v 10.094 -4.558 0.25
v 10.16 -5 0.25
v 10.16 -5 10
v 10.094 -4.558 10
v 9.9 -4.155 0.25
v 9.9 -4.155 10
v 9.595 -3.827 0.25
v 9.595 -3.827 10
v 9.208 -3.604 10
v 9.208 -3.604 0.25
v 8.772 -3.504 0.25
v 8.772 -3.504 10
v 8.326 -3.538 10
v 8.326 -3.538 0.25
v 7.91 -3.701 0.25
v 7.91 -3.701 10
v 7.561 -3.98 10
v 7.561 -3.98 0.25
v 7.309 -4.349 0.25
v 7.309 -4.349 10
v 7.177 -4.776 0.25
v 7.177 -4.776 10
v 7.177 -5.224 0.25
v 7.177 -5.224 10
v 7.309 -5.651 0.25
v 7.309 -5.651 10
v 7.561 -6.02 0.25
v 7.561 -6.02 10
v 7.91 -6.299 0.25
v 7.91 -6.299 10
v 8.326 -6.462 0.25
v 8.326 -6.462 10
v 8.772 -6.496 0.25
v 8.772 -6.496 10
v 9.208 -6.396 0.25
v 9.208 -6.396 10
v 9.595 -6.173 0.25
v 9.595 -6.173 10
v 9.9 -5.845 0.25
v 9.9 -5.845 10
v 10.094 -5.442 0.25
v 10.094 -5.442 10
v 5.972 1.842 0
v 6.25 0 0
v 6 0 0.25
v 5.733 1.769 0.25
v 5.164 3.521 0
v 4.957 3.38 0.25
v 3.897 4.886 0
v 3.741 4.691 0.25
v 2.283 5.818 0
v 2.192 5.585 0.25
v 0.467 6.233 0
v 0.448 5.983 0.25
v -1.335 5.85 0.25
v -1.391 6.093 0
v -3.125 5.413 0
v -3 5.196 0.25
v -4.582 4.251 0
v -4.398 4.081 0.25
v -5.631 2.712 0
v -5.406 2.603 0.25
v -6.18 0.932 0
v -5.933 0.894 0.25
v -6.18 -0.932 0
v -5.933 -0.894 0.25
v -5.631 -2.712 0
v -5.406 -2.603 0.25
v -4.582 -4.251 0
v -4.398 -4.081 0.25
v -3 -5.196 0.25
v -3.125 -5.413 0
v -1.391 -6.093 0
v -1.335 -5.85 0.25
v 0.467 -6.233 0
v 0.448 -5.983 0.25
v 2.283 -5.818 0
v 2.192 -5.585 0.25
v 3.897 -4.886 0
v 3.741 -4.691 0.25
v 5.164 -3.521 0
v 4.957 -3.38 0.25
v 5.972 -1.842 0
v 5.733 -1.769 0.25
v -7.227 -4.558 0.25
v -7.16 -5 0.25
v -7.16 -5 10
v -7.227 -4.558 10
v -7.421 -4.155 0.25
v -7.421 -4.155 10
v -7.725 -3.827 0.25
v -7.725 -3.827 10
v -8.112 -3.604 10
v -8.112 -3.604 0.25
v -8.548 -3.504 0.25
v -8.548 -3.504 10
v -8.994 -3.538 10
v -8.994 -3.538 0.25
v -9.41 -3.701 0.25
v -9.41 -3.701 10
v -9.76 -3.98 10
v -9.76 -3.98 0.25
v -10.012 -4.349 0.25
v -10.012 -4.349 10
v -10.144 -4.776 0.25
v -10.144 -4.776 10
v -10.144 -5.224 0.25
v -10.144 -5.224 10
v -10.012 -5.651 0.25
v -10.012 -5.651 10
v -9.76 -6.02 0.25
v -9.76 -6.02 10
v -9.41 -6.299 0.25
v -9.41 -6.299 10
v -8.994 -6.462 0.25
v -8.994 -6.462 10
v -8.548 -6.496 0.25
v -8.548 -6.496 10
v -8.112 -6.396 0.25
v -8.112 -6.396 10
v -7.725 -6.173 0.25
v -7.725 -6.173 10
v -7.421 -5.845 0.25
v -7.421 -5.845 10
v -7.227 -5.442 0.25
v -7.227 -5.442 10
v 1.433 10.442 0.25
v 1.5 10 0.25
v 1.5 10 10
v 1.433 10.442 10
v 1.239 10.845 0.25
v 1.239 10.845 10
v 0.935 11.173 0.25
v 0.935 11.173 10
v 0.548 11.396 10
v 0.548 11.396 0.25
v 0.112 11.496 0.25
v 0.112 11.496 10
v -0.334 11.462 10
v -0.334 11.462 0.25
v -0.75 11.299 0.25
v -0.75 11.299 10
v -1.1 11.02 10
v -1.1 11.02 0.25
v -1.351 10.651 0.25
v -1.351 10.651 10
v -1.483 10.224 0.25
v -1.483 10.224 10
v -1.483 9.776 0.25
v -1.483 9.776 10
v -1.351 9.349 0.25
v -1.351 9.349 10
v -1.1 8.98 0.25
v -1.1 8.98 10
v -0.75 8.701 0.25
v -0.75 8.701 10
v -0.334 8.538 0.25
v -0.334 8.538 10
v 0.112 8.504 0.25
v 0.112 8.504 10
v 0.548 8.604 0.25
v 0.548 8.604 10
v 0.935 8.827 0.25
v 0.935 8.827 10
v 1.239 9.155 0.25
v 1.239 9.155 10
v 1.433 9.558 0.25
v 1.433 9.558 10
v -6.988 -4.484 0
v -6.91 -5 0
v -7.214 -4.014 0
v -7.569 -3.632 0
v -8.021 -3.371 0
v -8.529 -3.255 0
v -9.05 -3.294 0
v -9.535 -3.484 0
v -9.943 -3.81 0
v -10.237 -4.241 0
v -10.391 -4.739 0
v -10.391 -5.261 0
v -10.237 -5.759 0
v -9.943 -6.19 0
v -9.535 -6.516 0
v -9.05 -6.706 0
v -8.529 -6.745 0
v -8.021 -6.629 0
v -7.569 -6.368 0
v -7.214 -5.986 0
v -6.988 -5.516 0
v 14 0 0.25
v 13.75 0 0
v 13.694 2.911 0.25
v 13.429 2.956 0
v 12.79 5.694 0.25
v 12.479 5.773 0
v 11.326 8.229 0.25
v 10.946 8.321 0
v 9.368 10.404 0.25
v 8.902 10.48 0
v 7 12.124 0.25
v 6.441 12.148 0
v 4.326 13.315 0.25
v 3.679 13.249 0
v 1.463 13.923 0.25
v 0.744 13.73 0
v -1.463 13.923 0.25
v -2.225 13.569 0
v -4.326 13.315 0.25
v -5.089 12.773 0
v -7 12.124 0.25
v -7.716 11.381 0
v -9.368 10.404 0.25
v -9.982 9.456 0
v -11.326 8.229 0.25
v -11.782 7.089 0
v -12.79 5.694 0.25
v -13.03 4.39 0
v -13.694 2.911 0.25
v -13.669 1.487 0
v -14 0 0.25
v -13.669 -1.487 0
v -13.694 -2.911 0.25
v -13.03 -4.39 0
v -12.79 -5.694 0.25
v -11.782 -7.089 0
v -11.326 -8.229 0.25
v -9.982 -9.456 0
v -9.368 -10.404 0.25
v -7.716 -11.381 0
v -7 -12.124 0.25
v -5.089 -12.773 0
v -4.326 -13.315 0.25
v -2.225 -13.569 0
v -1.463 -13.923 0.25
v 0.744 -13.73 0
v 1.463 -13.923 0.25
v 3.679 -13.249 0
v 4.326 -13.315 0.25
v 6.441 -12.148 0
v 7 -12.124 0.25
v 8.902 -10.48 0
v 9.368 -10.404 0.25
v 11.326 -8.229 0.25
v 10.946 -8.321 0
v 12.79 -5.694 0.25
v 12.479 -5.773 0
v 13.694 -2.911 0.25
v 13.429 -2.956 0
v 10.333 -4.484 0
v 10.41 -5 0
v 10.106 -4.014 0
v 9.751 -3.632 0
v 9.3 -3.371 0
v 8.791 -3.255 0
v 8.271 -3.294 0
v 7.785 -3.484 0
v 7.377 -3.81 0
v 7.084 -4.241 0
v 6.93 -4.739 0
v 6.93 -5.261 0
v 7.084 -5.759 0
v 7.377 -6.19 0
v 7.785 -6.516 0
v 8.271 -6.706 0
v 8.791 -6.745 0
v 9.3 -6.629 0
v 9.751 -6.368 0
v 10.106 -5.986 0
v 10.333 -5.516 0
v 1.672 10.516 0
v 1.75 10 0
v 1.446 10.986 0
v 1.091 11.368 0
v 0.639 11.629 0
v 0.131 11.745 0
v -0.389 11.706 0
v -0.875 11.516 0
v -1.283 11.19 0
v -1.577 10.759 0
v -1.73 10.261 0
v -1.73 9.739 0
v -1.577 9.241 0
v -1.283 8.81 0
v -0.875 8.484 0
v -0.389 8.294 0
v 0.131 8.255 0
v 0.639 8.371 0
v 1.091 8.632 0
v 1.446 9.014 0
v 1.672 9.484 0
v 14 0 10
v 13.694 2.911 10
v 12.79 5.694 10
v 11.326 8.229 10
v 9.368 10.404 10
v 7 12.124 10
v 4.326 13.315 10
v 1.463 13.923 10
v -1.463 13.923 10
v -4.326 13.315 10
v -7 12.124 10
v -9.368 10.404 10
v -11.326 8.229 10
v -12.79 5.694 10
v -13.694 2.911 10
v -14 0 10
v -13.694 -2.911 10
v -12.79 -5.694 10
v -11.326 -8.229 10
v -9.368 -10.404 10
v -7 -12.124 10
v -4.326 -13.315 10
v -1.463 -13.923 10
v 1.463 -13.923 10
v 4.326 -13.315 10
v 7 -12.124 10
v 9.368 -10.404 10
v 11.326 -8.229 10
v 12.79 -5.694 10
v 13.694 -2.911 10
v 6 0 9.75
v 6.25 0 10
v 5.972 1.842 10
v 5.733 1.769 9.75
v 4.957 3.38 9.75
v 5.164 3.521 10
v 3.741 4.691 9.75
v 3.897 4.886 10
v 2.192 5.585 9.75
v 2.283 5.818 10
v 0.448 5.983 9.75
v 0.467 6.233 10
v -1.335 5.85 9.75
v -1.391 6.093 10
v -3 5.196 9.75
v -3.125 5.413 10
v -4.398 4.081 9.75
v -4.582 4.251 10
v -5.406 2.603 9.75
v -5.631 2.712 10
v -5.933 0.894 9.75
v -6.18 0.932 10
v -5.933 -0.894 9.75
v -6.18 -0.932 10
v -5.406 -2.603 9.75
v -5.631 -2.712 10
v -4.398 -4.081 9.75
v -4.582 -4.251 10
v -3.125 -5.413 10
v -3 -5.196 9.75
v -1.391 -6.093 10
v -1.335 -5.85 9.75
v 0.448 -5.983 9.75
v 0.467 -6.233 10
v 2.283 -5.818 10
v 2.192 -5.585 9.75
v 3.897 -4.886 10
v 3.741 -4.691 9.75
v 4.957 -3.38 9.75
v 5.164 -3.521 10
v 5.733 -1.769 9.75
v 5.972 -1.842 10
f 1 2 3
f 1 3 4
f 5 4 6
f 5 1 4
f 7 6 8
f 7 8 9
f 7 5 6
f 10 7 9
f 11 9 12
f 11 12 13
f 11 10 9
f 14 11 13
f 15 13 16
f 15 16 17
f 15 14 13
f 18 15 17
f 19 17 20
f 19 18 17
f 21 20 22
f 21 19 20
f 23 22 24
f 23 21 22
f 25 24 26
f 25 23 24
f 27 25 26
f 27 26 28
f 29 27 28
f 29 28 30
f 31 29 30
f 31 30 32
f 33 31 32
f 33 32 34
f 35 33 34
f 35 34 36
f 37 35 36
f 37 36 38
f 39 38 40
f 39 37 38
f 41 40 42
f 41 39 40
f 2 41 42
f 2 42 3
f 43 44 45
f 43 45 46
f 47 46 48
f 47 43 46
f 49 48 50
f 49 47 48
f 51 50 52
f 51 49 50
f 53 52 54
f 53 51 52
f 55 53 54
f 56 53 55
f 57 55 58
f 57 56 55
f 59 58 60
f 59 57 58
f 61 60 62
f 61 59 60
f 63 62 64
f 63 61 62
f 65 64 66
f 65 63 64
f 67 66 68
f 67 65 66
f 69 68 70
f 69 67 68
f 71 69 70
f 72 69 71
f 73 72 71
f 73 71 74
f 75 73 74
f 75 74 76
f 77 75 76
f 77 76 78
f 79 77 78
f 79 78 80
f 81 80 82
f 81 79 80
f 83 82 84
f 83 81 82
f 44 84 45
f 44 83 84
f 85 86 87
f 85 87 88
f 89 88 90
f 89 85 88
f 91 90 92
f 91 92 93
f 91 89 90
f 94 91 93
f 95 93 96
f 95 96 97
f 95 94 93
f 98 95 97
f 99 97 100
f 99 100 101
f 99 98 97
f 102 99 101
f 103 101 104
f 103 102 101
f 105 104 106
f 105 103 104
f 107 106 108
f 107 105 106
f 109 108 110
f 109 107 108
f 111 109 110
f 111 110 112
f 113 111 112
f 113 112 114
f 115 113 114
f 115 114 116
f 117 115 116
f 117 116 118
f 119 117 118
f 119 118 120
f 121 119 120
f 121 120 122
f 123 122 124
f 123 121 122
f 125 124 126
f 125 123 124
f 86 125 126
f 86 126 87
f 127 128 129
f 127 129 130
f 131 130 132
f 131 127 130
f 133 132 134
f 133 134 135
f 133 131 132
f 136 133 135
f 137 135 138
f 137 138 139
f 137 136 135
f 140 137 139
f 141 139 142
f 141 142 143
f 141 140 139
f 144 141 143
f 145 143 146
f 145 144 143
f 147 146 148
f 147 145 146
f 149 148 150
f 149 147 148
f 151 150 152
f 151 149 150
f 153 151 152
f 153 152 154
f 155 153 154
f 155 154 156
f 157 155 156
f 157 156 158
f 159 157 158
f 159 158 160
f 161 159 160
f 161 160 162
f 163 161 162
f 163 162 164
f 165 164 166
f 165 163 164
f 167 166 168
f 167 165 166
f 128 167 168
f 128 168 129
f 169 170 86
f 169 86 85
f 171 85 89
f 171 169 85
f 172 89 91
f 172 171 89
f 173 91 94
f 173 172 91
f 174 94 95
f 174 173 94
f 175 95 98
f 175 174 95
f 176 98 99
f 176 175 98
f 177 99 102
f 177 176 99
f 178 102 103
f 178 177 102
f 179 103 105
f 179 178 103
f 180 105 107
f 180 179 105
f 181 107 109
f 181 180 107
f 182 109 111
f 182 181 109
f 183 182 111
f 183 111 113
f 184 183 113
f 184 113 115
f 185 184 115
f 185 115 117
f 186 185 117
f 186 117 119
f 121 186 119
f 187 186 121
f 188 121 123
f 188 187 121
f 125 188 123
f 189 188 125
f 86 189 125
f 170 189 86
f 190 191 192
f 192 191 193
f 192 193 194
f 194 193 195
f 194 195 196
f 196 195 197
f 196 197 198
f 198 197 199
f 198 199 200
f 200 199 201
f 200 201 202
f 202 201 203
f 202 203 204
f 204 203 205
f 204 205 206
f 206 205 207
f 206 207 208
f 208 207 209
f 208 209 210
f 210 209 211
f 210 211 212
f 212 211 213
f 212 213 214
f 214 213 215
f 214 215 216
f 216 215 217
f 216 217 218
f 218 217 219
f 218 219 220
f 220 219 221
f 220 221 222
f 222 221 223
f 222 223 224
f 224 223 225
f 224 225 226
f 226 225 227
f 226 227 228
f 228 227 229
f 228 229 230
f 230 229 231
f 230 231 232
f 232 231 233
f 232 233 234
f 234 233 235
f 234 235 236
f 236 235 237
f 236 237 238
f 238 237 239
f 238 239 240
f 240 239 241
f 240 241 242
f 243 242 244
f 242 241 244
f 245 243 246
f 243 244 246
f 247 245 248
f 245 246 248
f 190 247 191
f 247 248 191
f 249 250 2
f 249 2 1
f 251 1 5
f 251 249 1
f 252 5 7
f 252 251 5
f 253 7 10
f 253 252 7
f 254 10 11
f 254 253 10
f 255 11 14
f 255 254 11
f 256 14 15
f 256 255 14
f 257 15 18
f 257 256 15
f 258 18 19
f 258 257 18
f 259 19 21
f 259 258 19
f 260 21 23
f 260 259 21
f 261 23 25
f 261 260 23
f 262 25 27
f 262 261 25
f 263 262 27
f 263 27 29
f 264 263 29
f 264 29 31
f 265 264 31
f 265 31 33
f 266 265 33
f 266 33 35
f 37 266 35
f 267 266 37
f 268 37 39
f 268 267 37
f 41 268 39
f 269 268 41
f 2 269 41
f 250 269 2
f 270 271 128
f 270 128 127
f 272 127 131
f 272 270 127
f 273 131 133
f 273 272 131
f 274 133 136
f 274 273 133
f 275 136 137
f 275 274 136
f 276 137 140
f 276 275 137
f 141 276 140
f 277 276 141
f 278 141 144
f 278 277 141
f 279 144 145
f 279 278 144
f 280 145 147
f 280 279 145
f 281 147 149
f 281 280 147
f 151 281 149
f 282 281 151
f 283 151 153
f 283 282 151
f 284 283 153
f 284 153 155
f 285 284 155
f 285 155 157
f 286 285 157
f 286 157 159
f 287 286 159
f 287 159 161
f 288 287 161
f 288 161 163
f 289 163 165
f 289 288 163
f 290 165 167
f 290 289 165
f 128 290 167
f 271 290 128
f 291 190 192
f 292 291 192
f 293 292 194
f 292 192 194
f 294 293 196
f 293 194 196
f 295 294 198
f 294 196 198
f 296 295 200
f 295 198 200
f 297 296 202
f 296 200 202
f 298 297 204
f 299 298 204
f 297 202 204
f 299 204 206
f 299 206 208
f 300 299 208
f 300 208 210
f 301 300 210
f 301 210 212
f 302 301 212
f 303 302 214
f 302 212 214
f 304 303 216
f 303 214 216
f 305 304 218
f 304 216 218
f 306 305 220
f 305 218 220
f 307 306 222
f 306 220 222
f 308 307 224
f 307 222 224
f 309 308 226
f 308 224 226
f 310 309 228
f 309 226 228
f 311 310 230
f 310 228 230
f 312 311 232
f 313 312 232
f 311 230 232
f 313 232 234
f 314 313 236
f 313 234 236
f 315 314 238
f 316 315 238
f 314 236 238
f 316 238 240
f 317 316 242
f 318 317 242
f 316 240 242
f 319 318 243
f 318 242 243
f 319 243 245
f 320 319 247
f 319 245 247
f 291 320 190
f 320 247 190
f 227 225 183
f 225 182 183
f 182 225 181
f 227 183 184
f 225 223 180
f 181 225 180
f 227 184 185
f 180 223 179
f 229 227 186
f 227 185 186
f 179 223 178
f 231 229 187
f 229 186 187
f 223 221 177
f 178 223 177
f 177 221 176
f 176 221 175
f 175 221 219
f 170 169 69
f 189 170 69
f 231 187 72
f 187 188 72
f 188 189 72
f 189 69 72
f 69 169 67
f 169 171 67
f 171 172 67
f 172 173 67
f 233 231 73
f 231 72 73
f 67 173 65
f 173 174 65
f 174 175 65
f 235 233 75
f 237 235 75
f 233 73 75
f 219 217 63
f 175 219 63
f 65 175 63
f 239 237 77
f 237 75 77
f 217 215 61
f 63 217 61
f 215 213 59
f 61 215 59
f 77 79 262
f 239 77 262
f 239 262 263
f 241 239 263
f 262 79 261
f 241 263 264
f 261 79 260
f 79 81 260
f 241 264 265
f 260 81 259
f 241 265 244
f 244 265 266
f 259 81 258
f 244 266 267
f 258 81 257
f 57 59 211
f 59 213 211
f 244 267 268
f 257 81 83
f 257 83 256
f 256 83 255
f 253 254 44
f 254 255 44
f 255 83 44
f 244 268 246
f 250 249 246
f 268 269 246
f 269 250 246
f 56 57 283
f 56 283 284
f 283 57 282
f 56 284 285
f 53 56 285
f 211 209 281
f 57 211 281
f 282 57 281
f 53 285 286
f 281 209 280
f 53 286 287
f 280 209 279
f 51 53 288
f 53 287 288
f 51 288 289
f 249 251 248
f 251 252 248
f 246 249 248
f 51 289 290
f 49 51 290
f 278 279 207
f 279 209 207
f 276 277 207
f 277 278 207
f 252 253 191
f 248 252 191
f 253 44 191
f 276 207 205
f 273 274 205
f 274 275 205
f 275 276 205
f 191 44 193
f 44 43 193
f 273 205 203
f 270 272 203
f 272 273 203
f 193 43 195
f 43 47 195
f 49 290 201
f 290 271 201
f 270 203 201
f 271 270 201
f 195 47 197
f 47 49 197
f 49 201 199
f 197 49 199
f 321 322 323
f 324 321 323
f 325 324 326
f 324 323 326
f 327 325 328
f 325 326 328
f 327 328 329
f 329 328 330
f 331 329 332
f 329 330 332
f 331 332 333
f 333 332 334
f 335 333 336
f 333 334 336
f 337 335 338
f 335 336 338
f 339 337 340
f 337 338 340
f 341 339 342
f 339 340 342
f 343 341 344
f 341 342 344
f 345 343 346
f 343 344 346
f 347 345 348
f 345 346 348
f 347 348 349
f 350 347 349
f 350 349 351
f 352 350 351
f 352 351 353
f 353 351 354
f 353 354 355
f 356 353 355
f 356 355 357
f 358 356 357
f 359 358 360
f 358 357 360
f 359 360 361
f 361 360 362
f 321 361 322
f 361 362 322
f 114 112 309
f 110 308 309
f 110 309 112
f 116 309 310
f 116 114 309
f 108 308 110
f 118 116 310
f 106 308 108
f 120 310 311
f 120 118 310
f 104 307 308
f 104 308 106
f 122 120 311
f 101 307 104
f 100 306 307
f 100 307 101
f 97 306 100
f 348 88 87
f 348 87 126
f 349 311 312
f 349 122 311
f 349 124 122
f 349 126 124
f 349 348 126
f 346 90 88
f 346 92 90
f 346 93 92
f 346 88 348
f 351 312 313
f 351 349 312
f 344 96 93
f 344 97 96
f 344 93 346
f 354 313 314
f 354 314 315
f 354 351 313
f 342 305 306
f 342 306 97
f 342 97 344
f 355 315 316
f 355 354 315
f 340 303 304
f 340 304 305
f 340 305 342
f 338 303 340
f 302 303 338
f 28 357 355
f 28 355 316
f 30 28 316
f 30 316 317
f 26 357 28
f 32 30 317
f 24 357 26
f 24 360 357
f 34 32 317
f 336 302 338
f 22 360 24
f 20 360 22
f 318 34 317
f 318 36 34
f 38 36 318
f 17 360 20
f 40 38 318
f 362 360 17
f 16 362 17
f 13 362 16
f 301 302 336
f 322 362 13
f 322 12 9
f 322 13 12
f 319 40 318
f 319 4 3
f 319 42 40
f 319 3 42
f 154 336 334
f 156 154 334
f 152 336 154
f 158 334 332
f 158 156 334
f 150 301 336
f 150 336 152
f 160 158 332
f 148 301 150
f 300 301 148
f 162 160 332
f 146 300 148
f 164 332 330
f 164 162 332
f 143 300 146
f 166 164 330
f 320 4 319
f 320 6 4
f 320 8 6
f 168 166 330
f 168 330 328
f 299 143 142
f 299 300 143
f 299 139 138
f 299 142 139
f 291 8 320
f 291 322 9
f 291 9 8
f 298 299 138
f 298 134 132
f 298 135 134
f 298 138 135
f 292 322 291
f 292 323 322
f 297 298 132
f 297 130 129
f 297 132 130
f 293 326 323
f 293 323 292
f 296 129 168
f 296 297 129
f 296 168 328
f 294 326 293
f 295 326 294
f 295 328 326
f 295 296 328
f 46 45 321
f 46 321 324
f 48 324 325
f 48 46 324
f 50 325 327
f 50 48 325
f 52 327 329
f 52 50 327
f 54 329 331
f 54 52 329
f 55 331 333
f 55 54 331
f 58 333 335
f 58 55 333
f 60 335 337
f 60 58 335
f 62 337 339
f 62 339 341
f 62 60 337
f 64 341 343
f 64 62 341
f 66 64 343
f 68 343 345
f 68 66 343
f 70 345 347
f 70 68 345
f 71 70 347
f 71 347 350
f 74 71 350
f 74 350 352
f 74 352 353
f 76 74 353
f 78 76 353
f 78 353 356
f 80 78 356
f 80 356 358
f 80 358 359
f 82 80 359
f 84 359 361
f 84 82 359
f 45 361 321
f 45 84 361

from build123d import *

# Parameters (mm, degrees)
SKETCH2_R           = 14
SKETCH2_R_2         = 6
SKETCH2_R_3         = 1.5
BOSS_EXTRUDE1_DEPTH = 10
CHAMFER1_SIZE       = 0.25


with BuildPart() as part:
    # Sketch2 → Boss-Extrude1 (new body)
    with BuildSketch(Plane.XY):
        Circle(SKETCH2_R)
        Circle(SKETCH2_R_2, mode=Mode.SUBTRACT)
        with Locations((0, 10)):
            Circle(SKETCH2_R_3, mode=Mode.SUBTRACT)
        with Locations((8.660254038, -5)):
            Circle(SKETCH2_R_3, mode=Mode.SUBTRACT)
        with Locations((-8.660254038, -5)):
            Circle(SKETCH2_R_3, mode=Mode.SUBTRACT)
    extrude(amount=BOSS_EXTRUDE1_DEPTH)

    # Chamfer1
    chamfer1_edges = [part.edges().sort_by_distance(p)[0] for p in [
        (7.160254038, -5, 0),
        (-10.160254038, -5, 0),
        (-14, 0, 0),
        (-6, 0, 0),
        (-6, 0, 10),
        (-1.5, 10, 0),
    ]]
    chamfer(chamfer1_edges, length=CHAMFER1_SIZE)


solid = part.part
